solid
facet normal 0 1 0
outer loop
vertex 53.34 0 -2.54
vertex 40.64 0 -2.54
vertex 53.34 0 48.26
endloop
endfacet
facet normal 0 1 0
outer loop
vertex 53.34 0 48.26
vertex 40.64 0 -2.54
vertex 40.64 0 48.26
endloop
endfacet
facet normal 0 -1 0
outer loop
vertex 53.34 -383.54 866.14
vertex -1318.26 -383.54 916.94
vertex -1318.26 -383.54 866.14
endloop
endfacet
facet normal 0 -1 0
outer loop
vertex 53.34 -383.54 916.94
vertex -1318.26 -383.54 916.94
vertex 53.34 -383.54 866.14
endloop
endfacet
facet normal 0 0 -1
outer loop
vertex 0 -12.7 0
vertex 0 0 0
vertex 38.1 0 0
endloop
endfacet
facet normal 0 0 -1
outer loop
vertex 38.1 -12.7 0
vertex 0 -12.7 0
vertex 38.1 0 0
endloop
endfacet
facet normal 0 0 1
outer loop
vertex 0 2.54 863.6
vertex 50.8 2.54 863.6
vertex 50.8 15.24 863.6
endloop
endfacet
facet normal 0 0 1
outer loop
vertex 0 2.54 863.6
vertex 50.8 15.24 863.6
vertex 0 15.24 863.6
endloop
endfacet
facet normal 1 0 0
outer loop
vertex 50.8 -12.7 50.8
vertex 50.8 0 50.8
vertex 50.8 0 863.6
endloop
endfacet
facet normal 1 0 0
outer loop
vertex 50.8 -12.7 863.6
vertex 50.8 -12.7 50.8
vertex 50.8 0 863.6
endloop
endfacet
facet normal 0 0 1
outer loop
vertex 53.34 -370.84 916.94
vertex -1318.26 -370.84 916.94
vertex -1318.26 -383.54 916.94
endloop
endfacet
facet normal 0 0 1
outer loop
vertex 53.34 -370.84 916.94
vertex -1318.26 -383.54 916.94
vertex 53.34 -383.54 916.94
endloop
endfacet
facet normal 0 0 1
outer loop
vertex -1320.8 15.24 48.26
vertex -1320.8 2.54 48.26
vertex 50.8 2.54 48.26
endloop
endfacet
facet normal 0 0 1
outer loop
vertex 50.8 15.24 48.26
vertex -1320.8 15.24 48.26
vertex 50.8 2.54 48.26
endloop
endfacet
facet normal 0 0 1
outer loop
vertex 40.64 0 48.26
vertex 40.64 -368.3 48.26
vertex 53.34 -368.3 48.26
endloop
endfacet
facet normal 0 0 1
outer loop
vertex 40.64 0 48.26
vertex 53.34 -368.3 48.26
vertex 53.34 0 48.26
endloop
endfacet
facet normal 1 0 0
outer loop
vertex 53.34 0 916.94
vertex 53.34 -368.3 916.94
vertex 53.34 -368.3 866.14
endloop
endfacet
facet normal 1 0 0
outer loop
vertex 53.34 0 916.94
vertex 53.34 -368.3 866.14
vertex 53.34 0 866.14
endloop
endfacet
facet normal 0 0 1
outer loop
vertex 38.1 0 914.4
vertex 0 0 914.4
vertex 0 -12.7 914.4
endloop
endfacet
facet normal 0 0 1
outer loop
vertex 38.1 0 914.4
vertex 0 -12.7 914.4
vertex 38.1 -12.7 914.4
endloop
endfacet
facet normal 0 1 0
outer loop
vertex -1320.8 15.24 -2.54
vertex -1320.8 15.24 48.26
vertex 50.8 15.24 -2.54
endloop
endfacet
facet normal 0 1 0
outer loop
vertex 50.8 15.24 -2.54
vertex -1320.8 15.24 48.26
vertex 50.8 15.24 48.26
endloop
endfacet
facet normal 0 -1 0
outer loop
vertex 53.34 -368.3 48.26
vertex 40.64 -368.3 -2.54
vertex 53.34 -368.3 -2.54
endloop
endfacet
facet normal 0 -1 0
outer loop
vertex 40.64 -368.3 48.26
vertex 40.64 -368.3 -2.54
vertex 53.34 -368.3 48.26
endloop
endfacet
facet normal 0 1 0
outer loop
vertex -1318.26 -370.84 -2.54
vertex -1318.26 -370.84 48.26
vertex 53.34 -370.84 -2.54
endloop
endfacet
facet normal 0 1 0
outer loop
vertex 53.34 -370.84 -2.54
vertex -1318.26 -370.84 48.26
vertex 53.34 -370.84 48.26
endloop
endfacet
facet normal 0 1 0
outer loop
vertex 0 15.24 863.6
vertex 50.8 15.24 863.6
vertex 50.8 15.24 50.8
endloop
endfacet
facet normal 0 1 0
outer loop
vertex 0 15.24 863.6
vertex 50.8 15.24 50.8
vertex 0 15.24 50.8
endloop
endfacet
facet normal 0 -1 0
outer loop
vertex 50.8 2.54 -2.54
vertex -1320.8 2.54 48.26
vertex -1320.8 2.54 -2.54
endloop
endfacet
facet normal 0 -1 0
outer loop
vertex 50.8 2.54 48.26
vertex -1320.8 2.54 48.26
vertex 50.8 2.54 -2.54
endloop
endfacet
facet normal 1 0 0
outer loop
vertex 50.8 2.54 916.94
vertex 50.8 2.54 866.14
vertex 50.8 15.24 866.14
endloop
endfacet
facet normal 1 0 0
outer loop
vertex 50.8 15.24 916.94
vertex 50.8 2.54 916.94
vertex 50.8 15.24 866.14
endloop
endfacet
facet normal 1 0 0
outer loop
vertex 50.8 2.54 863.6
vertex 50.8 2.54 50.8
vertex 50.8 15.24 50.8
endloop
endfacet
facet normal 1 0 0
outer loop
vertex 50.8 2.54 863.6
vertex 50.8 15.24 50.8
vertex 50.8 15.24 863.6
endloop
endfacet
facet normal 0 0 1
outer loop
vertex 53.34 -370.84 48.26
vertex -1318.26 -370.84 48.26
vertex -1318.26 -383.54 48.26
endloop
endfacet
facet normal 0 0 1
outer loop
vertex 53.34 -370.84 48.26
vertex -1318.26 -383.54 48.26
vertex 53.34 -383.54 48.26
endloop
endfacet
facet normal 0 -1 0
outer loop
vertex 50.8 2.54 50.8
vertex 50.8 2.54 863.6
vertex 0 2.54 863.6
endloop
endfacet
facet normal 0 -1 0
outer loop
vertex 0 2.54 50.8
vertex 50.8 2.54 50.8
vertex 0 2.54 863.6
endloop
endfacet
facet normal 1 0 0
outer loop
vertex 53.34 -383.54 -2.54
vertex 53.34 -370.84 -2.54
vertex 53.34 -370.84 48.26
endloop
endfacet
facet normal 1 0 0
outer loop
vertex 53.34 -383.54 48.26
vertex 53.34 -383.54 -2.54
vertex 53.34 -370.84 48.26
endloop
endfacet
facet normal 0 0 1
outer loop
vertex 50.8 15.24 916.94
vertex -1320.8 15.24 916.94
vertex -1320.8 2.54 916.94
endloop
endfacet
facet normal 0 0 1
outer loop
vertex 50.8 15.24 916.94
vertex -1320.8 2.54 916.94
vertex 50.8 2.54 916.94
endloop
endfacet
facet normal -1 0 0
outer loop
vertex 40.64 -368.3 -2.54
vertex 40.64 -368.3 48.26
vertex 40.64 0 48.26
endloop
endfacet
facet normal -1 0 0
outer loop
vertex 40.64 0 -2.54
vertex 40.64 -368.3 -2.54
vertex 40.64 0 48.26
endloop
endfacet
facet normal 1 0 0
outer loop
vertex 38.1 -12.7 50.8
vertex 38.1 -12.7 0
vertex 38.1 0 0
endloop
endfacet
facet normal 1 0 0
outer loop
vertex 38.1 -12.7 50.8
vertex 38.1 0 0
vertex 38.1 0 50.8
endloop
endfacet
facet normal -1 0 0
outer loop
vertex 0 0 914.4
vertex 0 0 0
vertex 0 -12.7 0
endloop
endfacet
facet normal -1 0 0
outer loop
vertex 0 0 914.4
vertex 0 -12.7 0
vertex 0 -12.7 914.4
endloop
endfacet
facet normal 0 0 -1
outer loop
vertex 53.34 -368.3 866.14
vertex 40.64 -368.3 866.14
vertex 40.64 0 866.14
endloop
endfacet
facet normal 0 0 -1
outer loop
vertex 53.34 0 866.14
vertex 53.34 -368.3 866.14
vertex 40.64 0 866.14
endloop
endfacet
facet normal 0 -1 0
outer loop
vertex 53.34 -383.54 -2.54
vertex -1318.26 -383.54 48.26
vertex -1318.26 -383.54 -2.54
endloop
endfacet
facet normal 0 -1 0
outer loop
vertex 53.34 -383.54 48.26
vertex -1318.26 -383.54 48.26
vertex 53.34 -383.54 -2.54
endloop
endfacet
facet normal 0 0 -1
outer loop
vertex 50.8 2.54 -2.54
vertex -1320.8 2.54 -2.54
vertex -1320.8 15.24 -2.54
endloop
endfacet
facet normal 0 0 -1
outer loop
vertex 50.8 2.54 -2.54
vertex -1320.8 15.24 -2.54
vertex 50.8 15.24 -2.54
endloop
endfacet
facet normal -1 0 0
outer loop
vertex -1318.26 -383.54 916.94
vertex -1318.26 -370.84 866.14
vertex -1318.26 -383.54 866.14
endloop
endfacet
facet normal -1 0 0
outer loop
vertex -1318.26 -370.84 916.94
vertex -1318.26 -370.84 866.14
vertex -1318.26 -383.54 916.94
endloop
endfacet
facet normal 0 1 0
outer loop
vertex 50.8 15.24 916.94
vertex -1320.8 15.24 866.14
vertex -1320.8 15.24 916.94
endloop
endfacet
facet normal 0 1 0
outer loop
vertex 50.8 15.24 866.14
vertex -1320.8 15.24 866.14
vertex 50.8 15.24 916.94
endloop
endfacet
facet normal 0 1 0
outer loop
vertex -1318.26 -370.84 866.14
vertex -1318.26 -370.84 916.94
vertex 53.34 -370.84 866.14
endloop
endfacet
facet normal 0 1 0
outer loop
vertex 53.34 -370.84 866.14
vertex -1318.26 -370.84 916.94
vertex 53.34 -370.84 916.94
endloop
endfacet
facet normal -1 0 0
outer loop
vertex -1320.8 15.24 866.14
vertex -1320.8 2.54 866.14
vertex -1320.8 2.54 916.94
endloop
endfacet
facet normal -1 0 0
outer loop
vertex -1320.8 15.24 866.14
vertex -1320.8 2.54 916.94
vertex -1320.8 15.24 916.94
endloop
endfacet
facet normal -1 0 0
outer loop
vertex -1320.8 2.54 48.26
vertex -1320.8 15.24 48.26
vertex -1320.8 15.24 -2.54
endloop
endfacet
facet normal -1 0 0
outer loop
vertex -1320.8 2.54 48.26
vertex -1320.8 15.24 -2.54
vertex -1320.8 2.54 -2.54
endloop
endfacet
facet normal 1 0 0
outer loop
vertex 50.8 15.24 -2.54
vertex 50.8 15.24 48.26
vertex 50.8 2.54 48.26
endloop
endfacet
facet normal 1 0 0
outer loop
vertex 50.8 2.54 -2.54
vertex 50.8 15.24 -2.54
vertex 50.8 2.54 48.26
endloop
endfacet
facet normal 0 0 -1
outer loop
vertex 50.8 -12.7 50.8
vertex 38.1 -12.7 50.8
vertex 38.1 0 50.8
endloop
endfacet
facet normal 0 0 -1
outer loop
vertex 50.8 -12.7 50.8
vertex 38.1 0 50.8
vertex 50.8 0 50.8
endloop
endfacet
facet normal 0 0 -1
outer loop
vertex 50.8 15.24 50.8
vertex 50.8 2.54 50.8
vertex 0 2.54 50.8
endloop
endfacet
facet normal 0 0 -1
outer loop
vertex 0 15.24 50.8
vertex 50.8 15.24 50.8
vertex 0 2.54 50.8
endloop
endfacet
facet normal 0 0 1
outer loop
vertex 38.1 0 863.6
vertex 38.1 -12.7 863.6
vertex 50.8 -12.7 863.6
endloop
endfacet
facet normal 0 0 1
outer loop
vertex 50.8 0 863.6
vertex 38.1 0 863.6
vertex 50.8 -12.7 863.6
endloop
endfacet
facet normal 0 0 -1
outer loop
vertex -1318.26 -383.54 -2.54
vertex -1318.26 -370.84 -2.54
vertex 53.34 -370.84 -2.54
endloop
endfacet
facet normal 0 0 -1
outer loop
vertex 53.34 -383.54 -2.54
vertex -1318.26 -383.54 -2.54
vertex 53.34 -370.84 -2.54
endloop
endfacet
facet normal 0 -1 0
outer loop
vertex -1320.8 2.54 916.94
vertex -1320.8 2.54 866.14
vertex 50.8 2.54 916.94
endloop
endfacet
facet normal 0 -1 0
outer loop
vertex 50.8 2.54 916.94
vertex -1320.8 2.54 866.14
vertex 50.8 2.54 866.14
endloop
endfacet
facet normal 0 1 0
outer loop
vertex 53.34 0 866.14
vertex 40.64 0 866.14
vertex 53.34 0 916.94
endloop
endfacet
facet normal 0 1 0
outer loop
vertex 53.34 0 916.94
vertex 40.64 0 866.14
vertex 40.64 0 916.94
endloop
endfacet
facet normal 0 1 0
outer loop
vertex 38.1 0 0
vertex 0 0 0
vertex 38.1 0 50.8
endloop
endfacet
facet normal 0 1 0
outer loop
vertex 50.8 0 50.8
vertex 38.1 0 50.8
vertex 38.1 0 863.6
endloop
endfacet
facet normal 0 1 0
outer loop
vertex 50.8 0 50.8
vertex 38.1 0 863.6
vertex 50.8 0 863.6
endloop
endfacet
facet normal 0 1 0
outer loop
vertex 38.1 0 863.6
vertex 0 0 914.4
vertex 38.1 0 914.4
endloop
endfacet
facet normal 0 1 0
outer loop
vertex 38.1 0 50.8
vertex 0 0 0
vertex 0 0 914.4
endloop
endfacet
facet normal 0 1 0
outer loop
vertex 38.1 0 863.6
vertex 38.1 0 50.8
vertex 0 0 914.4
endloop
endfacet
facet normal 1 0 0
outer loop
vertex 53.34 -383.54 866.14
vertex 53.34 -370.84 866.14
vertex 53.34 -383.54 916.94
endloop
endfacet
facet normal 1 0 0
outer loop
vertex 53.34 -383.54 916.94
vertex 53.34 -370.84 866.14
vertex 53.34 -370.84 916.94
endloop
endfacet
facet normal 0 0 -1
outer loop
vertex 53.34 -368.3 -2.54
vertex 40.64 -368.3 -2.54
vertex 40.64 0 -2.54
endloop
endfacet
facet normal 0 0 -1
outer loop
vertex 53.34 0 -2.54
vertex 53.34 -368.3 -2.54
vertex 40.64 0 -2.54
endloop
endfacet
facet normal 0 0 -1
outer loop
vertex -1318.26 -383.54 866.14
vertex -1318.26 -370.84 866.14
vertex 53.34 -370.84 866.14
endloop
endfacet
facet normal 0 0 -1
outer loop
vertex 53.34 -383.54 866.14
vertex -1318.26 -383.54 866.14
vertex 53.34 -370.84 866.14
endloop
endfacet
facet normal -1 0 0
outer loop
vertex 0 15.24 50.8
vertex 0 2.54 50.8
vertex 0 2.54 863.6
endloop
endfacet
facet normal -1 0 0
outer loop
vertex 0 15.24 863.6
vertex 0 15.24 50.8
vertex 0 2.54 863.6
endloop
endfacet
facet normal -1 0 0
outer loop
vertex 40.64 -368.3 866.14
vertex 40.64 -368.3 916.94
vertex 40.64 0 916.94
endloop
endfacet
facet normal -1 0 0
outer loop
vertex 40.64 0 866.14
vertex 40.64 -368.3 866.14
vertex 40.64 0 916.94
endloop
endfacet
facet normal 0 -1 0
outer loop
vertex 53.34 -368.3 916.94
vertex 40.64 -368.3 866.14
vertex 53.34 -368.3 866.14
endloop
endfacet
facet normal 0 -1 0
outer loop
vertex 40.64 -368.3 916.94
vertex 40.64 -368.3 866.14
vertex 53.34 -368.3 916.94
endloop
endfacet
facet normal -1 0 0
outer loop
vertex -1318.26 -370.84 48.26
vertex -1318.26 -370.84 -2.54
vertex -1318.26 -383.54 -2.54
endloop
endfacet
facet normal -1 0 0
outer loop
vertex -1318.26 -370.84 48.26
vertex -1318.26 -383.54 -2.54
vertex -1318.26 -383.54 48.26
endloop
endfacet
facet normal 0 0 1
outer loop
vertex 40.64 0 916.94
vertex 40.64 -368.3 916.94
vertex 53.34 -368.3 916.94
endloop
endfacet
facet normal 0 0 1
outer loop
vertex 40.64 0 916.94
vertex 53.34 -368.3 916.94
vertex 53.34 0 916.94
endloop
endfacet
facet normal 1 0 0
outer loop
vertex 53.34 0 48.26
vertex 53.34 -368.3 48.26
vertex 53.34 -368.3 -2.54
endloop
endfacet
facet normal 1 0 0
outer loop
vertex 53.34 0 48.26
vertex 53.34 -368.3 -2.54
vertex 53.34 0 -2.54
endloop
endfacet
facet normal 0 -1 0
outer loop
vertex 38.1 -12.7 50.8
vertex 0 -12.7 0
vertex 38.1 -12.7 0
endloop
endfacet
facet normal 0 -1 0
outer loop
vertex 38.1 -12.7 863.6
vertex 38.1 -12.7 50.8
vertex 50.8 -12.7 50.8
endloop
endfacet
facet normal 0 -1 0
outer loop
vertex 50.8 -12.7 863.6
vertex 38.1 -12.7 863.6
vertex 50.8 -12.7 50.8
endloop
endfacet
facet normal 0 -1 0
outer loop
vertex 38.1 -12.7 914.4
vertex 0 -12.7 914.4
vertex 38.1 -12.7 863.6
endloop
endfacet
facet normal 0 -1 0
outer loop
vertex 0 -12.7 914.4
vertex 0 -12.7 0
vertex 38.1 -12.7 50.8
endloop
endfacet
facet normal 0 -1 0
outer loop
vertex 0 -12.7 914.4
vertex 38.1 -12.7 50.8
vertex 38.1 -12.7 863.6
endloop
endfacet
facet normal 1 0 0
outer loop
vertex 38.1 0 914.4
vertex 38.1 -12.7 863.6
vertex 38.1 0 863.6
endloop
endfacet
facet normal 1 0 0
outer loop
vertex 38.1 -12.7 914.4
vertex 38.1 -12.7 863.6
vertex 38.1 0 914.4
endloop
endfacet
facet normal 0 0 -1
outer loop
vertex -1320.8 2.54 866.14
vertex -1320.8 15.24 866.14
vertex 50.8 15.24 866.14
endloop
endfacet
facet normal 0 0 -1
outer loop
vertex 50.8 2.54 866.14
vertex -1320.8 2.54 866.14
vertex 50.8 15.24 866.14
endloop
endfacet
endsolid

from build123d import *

# Parameters (mm, degrees)
F0_W      = 50.8
F0_H      = 914.4
F1_DEPTH  = 12.7
F3_W      = 50.8
F3_H      = 812.8
F4_DEPTH  = 12.7
F6_W      = 1371.6
F6_H      = 12.7
F7_DEPTH  = 50.8
F9_W      = 1371.6
F9_H      = 12.7
F10_DEPTH = 50.8
F11_W     = 12.7
F11_H     = 50.8
F12_DEPTH = 12.7
F14_W     = 368.3
F14_H     = 50.8
F15_DEPTH = 12.7
F16_W     = 12.7
F16_H     = 50.8
F17_DEPTH = 12.7
F19_W     = 368.3
F19_H     = 50.8
F20_DEPTH = 12.7
F22_W     = 1371.6
F22_H     = 50.8
F23_DEPTH = 12.7
F25_W     = 1371.6
F25_H     = 50.8
F26_DEPTH = 12.7


with BuildPart() as f1:
    # F0 (on Front) → F1 (new body)
    with BuildSketch(Plane.XZ):
        with Locations((25.4, 457.2)):
            Rectangle(F0_W, F0_H)
    extrude(amount=F1_DEPTH)

    # F11 (on face) → F12 (cut)
    with BuildSketch(Plane.XZ.offset(12.7)):
        with Locations((44.45, 889)):
            Rectangle(F11_W, F11_H)
    extrude(amount=-F12_DEPTH, mode=Mode.SUBTRACT)

    # F16 (on face) → F17 (cut)
    with BuildSketch(Plane.XZ.offset(12.7)):
        with Locations((44.45, 25.4)):
            Rectangle(F16_W, F16_H)
    extrude(amount=-F17_DEPTH, mode=Mode.SUBTRACT)


with BuildPart() as f4:
    # F3 (on offset) → F4 (new body)
    with BuildSketch(Plane(origin=(0, 2.54, 0), x_dir=(-1, 0, 0), z_dir=(0, 1, 0))):
        with Locations((-25.4, 457.2)):
            Rectangle(F3_W, F3_H)
    extrude(amount=F4_DEPTH)


with BuildPart() as f7:
    # F6 (on offset) → F7 (new body)
    with BuildSketch(Plane(origin=(0, 0, 48.26), x_dir=(1, 0, 0), z_dir=(0, 0, -1))):
        with Locations((-635, -8.89)):
            Rectangle(F6_W, F6_H)
    extrude(amount=F7_DEPTH)


with BuildPart() as f10:
    # F9 (on offset) → F10 (new body)
    with BuildSketch(Plane.XY.offset(866.14)):
        with Locations((-635, 8.89)):
            Rectangle(F9_W, F9_H)
    extrude(amount=F10_DEPTH)


with BuildPart() as f15:
    # F14 (on offset) → F15 (new body)
    with BuildSketch(Plane.YZ.offset(40.64)):
        with Locations((-184.15, 891.54)):
            Rectangle(F14_W, F14_H)
    extrude(amount=F15_DEPTH)


with BuildPart() as f20:
    # F19 (on offset) → F20 (new body)
    with BuildSketch(Plane.YZ.offset(40.64)):
        with Locations((-184.15, 22.86)):
            Rectangle(F19_W, F19_H)
    extrude(amount=F20_DEPTH)


with BuildPart() as f23:
    # F22 (on offset) → F23 (new body)
    with BuildSketch(Plane.XZ.offset(370.84)):
        with Locations((-632.46, 891.54)):
            Rectangle(F22_W, F22_H)
    extrude(amount=F23_DEPTH)


with BuildPart() as f26:
    # F25 (on offset) → F26 (new body)
    with BuildSketch(Plane.XZ.offset(370.84)):
        with Locations((-632.46, 22.86)):
            Rectangle(F25_W, F25_H)
    extrude(amount=F26_DEPTH)


solid = Compound([f1.part, f4.part, f7.part, f10.part, f15.part, f20.part, f23.part, f26.part])
